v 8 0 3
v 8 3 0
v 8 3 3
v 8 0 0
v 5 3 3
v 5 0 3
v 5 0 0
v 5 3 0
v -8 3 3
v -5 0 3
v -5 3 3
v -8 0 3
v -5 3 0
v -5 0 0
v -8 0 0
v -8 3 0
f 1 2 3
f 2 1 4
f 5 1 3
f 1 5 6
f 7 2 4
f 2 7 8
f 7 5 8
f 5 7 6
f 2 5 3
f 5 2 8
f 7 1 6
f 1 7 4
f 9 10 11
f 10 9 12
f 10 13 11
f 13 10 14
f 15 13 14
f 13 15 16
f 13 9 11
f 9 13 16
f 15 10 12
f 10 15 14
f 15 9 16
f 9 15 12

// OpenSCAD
// BOSL-style mirror_copy() - creates original + mirrored copy
module mirror_copy(v = [1, 0, 0]) {
    children();
    mirror(v) children();
}

mirror_copy([1, 0, 0])
    translate([5, 0, 0])
        cube(3);
